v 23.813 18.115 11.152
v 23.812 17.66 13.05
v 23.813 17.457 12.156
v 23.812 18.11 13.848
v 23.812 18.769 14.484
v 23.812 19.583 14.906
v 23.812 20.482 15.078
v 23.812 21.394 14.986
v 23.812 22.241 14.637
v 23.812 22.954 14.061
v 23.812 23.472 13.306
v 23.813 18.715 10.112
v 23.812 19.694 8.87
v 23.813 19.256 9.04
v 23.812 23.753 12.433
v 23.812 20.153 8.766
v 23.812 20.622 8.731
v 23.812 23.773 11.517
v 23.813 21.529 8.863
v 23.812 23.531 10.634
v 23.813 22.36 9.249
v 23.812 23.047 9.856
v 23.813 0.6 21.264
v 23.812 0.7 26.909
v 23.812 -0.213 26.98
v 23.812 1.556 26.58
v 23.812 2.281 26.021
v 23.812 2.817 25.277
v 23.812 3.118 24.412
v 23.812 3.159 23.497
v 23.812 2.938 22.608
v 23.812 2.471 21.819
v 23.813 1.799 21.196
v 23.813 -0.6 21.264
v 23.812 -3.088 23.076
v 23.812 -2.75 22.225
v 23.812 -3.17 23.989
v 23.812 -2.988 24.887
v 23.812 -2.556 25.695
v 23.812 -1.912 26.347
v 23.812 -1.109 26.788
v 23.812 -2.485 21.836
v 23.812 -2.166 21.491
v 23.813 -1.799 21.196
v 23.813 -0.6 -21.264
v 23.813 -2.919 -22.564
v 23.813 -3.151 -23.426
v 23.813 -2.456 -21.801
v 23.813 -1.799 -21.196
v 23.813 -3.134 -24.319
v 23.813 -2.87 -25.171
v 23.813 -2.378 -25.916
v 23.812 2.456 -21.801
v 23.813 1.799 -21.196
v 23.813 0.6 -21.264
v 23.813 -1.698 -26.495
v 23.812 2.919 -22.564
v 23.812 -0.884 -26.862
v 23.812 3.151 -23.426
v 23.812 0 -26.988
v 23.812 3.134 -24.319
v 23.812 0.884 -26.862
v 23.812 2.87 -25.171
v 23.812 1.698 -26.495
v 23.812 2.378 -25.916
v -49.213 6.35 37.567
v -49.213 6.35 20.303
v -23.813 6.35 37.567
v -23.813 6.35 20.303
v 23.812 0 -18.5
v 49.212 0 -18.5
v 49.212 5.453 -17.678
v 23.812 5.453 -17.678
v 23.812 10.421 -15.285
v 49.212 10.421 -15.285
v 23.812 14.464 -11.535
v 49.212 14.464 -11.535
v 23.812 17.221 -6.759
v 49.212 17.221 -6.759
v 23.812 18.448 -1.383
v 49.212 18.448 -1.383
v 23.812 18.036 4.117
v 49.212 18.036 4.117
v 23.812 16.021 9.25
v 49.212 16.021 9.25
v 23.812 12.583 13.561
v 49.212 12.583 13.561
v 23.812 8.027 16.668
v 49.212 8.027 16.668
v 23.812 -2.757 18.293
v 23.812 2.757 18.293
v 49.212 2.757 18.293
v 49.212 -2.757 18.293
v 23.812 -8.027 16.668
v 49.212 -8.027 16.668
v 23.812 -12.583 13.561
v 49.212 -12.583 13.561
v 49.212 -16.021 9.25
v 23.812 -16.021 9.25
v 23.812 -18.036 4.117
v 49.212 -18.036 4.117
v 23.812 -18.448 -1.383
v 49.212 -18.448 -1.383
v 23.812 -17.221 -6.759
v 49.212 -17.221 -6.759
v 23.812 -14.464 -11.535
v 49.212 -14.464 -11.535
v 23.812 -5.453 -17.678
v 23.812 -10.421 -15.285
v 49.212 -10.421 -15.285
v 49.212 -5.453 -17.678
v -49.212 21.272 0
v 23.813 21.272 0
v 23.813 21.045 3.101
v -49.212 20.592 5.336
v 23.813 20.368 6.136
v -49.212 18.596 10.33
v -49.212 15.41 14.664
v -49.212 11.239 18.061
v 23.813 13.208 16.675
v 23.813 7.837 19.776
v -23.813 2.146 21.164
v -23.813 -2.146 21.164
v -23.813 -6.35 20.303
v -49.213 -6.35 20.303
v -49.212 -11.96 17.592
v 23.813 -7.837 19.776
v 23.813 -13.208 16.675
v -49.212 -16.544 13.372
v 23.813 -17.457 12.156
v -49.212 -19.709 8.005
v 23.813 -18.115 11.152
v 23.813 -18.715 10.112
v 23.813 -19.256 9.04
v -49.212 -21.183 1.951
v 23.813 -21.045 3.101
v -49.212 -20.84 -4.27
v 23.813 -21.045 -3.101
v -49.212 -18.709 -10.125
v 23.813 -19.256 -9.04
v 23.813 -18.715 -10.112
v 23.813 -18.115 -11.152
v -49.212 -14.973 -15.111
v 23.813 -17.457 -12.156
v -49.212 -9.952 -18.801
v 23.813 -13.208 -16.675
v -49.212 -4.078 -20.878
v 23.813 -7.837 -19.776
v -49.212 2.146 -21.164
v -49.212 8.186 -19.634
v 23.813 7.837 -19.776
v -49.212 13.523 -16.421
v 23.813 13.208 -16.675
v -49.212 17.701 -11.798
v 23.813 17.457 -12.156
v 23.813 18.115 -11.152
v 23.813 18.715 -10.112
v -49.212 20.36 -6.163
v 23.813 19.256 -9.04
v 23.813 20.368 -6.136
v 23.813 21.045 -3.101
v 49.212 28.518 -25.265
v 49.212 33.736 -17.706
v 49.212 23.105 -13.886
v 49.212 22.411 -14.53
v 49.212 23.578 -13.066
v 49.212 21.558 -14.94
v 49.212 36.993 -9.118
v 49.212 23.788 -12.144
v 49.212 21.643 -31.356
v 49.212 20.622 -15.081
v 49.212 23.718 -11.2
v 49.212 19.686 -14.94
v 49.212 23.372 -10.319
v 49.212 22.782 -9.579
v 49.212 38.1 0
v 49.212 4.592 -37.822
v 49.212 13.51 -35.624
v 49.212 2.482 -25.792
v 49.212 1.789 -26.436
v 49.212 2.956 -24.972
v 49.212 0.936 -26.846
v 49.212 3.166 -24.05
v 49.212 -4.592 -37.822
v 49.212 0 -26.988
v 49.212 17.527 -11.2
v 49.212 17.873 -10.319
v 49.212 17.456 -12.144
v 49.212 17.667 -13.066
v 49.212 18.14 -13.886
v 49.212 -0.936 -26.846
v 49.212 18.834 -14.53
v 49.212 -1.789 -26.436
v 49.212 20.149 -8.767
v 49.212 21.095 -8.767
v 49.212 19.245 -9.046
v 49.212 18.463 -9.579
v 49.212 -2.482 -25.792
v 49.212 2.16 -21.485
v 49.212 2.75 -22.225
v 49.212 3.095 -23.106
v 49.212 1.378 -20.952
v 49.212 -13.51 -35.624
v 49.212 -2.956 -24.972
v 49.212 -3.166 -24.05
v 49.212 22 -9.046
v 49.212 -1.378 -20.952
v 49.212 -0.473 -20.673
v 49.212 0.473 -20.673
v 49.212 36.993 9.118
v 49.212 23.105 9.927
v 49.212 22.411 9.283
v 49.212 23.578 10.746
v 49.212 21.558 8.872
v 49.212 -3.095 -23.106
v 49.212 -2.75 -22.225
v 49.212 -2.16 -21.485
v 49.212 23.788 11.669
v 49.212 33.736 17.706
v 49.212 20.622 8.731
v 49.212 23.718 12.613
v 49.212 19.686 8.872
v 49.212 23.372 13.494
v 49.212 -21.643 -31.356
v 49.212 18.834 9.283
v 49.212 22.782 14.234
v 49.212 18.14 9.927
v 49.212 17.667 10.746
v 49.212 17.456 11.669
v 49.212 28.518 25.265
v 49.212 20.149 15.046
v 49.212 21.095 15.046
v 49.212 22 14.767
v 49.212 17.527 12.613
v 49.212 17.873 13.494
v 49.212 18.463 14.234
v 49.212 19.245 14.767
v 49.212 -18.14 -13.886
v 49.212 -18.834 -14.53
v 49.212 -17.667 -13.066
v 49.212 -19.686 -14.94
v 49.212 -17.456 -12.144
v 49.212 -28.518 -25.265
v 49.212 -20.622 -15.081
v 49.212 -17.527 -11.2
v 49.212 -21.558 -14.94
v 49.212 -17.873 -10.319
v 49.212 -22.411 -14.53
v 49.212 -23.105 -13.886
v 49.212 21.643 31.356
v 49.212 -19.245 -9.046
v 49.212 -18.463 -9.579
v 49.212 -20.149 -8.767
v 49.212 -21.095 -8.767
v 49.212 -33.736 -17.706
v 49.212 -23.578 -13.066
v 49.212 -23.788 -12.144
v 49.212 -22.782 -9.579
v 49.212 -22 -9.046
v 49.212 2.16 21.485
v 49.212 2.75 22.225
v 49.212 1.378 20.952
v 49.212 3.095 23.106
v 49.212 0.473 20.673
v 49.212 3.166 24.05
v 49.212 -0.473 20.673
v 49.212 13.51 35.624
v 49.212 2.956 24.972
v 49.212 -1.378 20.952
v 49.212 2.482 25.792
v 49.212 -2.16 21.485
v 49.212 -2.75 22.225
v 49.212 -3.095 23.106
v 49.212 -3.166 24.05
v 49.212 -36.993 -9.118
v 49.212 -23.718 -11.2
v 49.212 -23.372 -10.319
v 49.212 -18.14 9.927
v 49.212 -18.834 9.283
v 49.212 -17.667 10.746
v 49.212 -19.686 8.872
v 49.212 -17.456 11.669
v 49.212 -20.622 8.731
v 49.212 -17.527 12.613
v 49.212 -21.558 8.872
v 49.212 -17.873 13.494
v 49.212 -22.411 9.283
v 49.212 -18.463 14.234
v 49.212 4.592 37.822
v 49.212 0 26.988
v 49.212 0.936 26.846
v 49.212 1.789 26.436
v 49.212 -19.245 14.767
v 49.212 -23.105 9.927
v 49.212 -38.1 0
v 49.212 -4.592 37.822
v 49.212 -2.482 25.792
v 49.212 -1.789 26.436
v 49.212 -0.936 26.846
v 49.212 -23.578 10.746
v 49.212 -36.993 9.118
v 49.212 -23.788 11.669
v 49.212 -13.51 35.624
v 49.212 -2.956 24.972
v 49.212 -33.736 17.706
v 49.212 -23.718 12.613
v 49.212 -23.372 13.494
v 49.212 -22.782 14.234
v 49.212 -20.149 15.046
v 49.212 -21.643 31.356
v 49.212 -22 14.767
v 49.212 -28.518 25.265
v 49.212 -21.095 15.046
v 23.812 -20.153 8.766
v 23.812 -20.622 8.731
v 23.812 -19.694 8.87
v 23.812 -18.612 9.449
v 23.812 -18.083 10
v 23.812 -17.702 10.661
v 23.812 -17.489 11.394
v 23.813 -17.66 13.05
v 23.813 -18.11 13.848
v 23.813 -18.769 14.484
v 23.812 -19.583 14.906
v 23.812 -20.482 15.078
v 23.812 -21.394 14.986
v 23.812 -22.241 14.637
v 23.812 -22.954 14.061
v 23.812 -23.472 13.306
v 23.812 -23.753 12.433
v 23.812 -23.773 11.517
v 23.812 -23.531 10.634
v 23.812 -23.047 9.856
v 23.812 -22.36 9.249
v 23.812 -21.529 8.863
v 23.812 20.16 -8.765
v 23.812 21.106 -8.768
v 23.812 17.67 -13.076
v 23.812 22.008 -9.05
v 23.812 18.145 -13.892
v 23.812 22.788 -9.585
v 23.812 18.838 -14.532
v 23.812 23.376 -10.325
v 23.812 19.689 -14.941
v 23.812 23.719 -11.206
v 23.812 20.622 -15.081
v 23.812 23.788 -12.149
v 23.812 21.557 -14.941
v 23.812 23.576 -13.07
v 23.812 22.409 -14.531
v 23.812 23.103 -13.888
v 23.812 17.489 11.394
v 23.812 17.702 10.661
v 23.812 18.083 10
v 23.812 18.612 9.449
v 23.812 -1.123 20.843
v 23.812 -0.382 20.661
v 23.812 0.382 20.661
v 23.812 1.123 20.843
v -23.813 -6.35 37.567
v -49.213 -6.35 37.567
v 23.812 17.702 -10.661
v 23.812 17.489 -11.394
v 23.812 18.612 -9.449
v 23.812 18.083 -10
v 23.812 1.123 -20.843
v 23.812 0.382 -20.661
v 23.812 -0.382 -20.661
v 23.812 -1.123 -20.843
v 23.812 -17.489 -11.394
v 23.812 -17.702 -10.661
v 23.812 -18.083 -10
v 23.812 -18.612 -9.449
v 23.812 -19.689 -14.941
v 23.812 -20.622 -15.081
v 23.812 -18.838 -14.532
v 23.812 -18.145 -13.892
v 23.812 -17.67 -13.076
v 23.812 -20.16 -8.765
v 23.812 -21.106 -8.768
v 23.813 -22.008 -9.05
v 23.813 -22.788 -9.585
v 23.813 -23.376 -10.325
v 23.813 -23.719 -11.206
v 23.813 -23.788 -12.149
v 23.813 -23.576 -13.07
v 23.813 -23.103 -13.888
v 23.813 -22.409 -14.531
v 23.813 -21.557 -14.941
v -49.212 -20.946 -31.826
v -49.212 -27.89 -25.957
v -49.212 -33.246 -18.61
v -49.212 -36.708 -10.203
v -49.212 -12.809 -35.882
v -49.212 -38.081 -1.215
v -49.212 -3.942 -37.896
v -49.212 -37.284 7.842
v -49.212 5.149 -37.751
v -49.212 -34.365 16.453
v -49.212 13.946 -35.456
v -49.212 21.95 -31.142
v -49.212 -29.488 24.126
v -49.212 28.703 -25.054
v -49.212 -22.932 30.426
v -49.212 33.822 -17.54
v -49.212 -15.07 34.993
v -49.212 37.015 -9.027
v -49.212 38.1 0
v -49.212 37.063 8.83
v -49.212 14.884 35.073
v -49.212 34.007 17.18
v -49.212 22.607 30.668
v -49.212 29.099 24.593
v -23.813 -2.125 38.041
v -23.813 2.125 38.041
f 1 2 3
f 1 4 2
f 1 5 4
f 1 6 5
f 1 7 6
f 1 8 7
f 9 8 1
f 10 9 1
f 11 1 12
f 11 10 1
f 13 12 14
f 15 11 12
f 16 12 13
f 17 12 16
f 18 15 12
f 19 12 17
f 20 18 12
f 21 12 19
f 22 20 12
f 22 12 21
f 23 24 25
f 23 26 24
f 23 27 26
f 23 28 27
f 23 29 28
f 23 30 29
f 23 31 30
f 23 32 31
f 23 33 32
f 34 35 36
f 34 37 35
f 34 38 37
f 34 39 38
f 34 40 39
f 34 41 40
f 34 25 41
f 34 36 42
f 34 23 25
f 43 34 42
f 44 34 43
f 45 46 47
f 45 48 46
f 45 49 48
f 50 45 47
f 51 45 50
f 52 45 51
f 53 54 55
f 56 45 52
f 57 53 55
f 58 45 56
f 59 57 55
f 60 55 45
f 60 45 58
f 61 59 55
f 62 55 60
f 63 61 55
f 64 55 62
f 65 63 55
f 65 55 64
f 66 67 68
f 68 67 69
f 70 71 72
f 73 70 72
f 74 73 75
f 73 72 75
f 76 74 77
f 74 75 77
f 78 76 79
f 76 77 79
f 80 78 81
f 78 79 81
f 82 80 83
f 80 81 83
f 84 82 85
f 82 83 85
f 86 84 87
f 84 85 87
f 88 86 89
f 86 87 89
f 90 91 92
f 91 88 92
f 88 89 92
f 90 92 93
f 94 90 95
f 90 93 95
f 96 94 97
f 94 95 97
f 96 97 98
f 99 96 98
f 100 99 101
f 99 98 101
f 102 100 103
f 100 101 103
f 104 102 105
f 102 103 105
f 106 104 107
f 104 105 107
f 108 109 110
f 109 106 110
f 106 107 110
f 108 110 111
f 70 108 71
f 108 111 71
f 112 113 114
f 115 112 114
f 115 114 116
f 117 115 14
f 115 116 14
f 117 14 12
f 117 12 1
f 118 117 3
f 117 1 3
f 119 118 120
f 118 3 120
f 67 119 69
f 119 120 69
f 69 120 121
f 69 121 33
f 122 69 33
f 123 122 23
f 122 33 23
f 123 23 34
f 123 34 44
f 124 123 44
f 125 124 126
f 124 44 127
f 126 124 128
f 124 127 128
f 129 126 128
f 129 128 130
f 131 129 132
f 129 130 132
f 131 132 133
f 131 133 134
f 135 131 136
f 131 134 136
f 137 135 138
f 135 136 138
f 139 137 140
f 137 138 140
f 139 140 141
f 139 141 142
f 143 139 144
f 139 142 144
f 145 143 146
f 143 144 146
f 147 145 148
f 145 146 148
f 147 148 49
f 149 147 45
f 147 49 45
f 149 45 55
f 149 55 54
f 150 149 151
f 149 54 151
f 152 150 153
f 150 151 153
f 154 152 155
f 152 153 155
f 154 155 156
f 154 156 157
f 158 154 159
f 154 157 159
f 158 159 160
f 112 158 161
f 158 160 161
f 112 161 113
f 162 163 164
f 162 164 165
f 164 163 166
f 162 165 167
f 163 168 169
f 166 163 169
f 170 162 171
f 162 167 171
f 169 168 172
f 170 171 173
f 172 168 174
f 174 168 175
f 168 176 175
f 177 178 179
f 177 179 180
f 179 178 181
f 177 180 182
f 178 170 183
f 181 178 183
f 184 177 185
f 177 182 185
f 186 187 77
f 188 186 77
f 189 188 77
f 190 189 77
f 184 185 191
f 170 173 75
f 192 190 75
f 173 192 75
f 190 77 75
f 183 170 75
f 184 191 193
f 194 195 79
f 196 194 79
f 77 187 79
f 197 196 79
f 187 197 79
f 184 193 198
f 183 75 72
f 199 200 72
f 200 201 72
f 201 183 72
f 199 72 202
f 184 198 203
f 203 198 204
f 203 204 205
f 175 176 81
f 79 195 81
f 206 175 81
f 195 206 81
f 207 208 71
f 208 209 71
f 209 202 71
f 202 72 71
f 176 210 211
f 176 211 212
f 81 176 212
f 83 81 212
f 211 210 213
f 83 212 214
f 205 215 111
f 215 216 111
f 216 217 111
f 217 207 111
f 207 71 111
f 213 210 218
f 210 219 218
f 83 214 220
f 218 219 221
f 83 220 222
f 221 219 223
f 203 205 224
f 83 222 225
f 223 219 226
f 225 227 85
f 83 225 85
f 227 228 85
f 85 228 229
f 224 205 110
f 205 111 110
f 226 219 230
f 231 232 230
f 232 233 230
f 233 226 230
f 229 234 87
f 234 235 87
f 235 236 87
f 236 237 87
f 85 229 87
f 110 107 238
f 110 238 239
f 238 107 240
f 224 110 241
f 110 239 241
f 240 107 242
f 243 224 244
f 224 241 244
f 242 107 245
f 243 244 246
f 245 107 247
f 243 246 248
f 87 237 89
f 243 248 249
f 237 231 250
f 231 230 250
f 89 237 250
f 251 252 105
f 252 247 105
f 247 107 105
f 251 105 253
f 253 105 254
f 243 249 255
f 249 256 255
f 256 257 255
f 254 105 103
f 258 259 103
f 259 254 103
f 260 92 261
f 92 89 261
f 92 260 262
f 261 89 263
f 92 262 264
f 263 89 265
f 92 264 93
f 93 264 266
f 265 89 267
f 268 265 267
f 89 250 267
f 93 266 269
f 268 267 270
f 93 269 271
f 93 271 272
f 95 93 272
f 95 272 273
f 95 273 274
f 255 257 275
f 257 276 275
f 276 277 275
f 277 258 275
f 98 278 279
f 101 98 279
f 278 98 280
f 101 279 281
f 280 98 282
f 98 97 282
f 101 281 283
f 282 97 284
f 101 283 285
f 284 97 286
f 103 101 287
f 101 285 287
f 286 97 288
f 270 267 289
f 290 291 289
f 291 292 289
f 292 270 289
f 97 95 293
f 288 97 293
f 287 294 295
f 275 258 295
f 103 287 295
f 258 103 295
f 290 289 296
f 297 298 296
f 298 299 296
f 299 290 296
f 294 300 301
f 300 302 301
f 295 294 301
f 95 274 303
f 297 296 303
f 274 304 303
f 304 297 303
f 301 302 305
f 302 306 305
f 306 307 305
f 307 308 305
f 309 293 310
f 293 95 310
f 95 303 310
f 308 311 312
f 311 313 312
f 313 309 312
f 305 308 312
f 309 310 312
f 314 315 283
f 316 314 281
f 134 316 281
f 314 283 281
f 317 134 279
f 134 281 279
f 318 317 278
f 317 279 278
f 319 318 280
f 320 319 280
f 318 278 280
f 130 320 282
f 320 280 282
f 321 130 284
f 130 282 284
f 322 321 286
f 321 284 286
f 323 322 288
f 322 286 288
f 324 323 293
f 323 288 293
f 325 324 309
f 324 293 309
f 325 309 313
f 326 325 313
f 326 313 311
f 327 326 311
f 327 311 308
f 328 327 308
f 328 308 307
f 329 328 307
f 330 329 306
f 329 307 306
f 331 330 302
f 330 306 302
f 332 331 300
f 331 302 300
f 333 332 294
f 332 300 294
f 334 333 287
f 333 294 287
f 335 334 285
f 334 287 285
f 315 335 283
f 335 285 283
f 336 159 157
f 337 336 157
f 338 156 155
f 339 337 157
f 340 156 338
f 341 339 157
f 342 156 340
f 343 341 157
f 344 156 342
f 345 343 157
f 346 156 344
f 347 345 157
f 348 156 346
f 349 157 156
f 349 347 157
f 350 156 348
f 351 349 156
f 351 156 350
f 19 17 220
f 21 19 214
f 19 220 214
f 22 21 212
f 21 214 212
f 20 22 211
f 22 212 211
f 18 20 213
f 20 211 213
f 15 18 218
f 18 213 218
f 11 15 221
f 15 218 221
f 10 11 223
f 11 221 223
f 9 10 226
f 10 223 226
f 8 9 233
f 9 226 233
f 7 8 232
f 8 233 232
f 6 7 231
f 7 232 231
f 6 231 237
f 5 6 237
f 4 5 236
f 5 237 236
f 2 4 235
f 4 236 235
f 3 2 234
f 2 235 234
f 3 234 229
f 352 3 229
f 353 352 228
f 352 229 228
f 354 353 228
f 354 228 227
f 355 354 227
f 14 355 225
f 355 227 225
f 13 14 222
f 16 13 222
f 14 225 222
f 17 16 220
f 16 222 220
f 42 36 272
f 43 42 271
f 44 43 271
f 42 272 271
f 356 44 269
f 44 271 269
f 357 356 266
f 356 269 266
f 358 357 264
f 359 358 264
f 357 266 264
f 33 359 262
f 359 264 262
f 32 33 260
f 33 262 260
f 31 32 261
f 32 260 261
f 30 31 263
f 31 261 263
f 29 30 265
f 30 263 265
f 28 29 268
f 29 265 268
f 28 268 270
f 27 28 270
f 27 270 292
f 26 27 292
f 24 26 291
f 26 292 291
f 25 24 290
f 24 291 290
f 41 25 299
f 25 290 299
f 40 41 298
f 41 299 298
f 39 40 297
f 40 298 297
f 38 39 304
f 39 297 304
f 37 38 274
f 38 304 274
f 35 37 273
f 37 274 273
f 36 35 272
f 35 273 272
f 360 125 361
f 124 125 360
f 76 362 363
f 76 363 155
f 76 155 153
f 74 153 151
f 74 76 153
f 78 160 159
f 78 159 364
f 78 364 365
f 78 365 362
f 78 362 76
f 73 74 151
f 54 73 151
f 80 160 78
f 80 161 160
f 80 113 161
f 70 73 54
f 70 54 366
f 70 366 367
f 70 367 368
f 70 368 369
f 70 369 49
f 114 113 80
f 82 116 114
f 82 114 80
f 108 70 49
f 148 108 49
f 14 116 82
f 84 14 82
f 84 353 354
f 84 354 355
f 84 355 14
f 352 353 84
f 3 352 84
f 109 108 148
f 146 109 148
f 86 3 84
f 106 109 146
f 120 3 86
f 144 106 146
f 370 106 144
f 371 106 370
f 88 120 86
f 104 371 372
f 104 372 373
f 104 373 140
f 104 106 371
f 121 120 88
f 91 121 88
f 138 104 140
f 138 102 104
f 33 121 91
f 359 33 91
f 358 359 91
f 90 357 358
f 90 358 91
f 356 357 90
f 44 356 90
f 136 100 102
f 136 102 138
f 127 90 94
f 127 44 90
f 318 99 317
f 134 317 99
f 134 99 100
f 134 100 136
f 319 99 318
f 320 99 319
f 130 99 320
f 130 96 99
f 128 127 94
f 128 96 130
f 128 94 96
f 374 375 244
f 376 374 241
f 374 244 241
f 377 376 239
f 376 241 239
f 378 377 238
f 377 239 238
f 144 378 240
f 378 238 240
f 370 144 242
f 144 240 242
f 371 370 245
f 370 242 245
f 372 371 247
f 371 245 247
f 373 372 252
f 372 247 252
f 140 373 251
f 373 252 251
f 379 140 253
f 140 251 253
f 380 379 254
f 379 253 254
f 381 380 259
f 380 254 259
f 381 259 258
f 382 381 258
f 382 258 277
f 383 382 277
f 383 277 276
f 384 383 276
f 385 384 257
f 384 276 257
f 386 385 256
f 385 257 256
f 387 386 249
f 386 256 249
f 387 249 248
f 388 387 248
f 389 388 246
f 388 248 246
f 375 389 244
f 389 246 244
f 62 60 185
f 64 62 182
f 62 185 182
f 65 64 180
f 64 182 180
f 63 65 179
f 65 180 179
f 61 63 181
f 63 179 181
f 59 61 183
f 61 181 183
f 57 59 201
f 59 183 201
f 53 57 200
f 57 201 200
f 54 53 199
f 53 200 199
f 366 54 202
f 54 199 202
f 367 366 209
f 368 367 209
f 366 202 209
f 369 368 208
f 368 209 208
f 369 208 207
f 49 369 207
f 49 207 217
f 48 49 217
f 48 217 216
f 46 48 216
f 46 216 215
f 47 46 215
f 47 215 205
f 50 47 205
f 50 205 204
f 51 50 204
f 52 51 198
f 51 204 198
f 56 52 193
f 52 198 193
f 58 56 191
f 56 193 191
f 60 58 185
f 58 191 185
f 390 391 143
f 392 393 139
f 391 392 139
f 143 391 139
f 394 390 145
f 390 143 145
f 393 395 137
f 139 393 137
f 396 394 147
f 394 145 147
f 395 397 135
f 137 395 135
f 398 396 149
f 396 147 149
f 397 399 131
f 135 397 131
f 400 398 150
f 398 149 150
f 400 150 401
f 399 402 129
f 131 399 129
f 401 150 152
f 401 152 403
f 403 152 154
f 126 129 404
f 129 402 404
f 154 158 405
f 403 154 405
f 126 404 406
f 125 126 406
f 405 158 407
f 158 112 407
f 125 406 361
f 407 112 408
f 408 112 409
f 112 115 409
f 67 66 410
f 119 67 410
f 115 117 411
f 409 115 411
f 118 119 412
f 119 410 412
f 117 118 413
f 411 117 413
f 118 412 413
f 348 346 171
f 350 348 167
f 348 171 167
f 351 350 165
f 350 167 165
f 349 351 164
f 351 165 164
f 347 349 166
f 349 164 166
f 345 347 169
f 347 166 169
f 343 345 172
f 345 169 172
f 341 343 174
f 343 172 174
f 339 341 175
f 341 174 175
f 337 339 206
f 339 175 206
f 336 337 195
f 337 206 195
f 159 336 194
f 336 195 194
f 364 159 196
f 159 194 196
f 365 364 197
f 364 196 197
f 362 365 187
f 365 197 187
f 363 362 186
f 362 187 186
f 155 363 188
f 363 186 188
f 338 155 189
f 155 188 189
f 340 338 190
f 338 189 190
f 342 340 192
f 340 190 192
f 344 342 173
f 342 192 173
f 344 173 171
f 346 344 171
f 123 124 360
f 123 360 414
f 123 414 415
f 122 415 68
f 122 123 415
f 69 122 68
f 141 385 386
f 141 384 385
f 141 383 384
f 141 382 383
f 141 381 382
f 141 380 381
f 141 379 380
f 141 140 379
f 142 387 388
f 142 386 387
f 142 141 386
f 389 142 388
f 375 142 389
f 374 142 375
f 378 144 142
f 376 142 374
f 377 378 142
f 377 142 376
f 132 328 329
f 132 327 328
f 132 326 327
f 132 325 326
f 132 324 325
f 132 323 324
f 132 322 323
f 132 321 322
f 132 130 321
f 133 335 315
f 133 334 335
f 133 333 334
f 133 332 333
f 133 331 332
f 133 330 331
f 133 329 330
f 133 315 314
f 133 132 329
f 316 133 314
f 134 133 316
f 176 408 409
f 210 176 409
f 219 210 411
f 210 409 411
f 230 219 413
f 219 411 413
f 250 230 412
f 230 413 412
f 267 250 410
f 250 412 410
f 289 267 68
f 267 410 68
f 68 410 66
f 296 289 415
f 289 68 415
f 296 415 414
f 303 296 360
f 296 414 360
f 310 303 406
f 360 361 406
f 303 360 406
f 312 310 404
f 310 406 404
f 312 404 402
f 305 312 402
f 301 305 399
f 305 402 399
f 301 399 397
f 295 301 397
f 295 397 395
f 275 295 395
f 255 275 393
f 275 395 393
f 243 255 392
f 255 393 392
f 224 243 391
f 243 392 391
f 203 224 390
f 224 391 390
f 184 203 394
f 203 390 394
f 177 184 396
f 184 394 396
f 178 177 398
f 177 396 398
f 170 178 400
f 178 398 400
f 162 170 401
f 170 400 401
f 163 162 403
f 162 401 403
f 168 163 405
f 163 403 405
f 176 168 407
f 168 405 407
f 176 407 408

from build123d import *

# Parameters (mm, degrees)
SKETCH1_W          = 25.4
SKETCH1_H          = 5.3975
SKETCH2_R          = 3.175
SKETCH2_R_2        = 18.5
CUT_EXTRUDE1_DEPTH = 25.4
CIRPATTERN1_COUNT  = 6
SKETCH3_W          = 25.4
SKETCH3_H          = 12.7
CUT_EXTRUDE2_DEPTH = 39.1


with BuildPart() as part:
    # Sketch1 → Revolve1 (revolve)
    with BuildSketch(Plane.XY):
        Polygon((-49.2125, 38.1), (-49.2125, 21.2725), (23.8125, 21.2725), (49.2125, 21.2725), (49.2125, 38.1), (42.8625, 38.1), align=None)
        with Locations((36.5125, 18.57375)):
            Rectangle(SKETCH1_W, SKETCH1_H)
    revolve(axis=Axis((-49.2125, 0, 0), (1, 0, 0)))

    # Sketch2 → Cut-Extrude1 (cut)
    with BuildSketch(Plane(origin=(49.2125, 0, 0), x_dir=(0, 0, -1), z_dir=(1, 0, 0))):
        with Locations((-11.90625, -20.622229928)):
            Circle(SKETCH2_R)
        with Locations((11.90625, -20.622229928)):
            Circle(SKETCH2_R)
        with Locations((23.8125, 0)):
            Circle(SKETCH2_R)
        with Locations((11.90625, 20.622229928)):
            Circle(SKETCH2_R)
        with Locations((-11.90625, 20.622229928)):
            Circle(SKETCH2_R)
        Circle(SKETCH2_R_2)
    cut_extrude1 = extrude(amount=-CUT_EXTRUDE1_DEPTH, mode=Mode.SUBTRACT)

    # CirPattern1: Cut-Extrude1 ×6 about axis
    cirpattern1_axis = Axis((-49.2125, 0, 0), (-1, 0, 0))
    for i in range(1, CIRPATTERN1_COUNT):
        add(cut_extrude1.rotate(cirpattern1_axis, i * 360 / CIRPATTERN1_COUNT), mode=Mode.SUBTRACT)

    # Sketch3 → Cut-Extrude2 (cut, through all)
    with BuildSketch(Plane.XY):
        with Locations((-36.5125, 0)):
            Rectangle(SKETCH3_W, SKETCH3_H)
    extrude(amount=CUT_EXTRUDE2_DEPTH, mode=Mode.SUBTRACT)


solid = part.part
